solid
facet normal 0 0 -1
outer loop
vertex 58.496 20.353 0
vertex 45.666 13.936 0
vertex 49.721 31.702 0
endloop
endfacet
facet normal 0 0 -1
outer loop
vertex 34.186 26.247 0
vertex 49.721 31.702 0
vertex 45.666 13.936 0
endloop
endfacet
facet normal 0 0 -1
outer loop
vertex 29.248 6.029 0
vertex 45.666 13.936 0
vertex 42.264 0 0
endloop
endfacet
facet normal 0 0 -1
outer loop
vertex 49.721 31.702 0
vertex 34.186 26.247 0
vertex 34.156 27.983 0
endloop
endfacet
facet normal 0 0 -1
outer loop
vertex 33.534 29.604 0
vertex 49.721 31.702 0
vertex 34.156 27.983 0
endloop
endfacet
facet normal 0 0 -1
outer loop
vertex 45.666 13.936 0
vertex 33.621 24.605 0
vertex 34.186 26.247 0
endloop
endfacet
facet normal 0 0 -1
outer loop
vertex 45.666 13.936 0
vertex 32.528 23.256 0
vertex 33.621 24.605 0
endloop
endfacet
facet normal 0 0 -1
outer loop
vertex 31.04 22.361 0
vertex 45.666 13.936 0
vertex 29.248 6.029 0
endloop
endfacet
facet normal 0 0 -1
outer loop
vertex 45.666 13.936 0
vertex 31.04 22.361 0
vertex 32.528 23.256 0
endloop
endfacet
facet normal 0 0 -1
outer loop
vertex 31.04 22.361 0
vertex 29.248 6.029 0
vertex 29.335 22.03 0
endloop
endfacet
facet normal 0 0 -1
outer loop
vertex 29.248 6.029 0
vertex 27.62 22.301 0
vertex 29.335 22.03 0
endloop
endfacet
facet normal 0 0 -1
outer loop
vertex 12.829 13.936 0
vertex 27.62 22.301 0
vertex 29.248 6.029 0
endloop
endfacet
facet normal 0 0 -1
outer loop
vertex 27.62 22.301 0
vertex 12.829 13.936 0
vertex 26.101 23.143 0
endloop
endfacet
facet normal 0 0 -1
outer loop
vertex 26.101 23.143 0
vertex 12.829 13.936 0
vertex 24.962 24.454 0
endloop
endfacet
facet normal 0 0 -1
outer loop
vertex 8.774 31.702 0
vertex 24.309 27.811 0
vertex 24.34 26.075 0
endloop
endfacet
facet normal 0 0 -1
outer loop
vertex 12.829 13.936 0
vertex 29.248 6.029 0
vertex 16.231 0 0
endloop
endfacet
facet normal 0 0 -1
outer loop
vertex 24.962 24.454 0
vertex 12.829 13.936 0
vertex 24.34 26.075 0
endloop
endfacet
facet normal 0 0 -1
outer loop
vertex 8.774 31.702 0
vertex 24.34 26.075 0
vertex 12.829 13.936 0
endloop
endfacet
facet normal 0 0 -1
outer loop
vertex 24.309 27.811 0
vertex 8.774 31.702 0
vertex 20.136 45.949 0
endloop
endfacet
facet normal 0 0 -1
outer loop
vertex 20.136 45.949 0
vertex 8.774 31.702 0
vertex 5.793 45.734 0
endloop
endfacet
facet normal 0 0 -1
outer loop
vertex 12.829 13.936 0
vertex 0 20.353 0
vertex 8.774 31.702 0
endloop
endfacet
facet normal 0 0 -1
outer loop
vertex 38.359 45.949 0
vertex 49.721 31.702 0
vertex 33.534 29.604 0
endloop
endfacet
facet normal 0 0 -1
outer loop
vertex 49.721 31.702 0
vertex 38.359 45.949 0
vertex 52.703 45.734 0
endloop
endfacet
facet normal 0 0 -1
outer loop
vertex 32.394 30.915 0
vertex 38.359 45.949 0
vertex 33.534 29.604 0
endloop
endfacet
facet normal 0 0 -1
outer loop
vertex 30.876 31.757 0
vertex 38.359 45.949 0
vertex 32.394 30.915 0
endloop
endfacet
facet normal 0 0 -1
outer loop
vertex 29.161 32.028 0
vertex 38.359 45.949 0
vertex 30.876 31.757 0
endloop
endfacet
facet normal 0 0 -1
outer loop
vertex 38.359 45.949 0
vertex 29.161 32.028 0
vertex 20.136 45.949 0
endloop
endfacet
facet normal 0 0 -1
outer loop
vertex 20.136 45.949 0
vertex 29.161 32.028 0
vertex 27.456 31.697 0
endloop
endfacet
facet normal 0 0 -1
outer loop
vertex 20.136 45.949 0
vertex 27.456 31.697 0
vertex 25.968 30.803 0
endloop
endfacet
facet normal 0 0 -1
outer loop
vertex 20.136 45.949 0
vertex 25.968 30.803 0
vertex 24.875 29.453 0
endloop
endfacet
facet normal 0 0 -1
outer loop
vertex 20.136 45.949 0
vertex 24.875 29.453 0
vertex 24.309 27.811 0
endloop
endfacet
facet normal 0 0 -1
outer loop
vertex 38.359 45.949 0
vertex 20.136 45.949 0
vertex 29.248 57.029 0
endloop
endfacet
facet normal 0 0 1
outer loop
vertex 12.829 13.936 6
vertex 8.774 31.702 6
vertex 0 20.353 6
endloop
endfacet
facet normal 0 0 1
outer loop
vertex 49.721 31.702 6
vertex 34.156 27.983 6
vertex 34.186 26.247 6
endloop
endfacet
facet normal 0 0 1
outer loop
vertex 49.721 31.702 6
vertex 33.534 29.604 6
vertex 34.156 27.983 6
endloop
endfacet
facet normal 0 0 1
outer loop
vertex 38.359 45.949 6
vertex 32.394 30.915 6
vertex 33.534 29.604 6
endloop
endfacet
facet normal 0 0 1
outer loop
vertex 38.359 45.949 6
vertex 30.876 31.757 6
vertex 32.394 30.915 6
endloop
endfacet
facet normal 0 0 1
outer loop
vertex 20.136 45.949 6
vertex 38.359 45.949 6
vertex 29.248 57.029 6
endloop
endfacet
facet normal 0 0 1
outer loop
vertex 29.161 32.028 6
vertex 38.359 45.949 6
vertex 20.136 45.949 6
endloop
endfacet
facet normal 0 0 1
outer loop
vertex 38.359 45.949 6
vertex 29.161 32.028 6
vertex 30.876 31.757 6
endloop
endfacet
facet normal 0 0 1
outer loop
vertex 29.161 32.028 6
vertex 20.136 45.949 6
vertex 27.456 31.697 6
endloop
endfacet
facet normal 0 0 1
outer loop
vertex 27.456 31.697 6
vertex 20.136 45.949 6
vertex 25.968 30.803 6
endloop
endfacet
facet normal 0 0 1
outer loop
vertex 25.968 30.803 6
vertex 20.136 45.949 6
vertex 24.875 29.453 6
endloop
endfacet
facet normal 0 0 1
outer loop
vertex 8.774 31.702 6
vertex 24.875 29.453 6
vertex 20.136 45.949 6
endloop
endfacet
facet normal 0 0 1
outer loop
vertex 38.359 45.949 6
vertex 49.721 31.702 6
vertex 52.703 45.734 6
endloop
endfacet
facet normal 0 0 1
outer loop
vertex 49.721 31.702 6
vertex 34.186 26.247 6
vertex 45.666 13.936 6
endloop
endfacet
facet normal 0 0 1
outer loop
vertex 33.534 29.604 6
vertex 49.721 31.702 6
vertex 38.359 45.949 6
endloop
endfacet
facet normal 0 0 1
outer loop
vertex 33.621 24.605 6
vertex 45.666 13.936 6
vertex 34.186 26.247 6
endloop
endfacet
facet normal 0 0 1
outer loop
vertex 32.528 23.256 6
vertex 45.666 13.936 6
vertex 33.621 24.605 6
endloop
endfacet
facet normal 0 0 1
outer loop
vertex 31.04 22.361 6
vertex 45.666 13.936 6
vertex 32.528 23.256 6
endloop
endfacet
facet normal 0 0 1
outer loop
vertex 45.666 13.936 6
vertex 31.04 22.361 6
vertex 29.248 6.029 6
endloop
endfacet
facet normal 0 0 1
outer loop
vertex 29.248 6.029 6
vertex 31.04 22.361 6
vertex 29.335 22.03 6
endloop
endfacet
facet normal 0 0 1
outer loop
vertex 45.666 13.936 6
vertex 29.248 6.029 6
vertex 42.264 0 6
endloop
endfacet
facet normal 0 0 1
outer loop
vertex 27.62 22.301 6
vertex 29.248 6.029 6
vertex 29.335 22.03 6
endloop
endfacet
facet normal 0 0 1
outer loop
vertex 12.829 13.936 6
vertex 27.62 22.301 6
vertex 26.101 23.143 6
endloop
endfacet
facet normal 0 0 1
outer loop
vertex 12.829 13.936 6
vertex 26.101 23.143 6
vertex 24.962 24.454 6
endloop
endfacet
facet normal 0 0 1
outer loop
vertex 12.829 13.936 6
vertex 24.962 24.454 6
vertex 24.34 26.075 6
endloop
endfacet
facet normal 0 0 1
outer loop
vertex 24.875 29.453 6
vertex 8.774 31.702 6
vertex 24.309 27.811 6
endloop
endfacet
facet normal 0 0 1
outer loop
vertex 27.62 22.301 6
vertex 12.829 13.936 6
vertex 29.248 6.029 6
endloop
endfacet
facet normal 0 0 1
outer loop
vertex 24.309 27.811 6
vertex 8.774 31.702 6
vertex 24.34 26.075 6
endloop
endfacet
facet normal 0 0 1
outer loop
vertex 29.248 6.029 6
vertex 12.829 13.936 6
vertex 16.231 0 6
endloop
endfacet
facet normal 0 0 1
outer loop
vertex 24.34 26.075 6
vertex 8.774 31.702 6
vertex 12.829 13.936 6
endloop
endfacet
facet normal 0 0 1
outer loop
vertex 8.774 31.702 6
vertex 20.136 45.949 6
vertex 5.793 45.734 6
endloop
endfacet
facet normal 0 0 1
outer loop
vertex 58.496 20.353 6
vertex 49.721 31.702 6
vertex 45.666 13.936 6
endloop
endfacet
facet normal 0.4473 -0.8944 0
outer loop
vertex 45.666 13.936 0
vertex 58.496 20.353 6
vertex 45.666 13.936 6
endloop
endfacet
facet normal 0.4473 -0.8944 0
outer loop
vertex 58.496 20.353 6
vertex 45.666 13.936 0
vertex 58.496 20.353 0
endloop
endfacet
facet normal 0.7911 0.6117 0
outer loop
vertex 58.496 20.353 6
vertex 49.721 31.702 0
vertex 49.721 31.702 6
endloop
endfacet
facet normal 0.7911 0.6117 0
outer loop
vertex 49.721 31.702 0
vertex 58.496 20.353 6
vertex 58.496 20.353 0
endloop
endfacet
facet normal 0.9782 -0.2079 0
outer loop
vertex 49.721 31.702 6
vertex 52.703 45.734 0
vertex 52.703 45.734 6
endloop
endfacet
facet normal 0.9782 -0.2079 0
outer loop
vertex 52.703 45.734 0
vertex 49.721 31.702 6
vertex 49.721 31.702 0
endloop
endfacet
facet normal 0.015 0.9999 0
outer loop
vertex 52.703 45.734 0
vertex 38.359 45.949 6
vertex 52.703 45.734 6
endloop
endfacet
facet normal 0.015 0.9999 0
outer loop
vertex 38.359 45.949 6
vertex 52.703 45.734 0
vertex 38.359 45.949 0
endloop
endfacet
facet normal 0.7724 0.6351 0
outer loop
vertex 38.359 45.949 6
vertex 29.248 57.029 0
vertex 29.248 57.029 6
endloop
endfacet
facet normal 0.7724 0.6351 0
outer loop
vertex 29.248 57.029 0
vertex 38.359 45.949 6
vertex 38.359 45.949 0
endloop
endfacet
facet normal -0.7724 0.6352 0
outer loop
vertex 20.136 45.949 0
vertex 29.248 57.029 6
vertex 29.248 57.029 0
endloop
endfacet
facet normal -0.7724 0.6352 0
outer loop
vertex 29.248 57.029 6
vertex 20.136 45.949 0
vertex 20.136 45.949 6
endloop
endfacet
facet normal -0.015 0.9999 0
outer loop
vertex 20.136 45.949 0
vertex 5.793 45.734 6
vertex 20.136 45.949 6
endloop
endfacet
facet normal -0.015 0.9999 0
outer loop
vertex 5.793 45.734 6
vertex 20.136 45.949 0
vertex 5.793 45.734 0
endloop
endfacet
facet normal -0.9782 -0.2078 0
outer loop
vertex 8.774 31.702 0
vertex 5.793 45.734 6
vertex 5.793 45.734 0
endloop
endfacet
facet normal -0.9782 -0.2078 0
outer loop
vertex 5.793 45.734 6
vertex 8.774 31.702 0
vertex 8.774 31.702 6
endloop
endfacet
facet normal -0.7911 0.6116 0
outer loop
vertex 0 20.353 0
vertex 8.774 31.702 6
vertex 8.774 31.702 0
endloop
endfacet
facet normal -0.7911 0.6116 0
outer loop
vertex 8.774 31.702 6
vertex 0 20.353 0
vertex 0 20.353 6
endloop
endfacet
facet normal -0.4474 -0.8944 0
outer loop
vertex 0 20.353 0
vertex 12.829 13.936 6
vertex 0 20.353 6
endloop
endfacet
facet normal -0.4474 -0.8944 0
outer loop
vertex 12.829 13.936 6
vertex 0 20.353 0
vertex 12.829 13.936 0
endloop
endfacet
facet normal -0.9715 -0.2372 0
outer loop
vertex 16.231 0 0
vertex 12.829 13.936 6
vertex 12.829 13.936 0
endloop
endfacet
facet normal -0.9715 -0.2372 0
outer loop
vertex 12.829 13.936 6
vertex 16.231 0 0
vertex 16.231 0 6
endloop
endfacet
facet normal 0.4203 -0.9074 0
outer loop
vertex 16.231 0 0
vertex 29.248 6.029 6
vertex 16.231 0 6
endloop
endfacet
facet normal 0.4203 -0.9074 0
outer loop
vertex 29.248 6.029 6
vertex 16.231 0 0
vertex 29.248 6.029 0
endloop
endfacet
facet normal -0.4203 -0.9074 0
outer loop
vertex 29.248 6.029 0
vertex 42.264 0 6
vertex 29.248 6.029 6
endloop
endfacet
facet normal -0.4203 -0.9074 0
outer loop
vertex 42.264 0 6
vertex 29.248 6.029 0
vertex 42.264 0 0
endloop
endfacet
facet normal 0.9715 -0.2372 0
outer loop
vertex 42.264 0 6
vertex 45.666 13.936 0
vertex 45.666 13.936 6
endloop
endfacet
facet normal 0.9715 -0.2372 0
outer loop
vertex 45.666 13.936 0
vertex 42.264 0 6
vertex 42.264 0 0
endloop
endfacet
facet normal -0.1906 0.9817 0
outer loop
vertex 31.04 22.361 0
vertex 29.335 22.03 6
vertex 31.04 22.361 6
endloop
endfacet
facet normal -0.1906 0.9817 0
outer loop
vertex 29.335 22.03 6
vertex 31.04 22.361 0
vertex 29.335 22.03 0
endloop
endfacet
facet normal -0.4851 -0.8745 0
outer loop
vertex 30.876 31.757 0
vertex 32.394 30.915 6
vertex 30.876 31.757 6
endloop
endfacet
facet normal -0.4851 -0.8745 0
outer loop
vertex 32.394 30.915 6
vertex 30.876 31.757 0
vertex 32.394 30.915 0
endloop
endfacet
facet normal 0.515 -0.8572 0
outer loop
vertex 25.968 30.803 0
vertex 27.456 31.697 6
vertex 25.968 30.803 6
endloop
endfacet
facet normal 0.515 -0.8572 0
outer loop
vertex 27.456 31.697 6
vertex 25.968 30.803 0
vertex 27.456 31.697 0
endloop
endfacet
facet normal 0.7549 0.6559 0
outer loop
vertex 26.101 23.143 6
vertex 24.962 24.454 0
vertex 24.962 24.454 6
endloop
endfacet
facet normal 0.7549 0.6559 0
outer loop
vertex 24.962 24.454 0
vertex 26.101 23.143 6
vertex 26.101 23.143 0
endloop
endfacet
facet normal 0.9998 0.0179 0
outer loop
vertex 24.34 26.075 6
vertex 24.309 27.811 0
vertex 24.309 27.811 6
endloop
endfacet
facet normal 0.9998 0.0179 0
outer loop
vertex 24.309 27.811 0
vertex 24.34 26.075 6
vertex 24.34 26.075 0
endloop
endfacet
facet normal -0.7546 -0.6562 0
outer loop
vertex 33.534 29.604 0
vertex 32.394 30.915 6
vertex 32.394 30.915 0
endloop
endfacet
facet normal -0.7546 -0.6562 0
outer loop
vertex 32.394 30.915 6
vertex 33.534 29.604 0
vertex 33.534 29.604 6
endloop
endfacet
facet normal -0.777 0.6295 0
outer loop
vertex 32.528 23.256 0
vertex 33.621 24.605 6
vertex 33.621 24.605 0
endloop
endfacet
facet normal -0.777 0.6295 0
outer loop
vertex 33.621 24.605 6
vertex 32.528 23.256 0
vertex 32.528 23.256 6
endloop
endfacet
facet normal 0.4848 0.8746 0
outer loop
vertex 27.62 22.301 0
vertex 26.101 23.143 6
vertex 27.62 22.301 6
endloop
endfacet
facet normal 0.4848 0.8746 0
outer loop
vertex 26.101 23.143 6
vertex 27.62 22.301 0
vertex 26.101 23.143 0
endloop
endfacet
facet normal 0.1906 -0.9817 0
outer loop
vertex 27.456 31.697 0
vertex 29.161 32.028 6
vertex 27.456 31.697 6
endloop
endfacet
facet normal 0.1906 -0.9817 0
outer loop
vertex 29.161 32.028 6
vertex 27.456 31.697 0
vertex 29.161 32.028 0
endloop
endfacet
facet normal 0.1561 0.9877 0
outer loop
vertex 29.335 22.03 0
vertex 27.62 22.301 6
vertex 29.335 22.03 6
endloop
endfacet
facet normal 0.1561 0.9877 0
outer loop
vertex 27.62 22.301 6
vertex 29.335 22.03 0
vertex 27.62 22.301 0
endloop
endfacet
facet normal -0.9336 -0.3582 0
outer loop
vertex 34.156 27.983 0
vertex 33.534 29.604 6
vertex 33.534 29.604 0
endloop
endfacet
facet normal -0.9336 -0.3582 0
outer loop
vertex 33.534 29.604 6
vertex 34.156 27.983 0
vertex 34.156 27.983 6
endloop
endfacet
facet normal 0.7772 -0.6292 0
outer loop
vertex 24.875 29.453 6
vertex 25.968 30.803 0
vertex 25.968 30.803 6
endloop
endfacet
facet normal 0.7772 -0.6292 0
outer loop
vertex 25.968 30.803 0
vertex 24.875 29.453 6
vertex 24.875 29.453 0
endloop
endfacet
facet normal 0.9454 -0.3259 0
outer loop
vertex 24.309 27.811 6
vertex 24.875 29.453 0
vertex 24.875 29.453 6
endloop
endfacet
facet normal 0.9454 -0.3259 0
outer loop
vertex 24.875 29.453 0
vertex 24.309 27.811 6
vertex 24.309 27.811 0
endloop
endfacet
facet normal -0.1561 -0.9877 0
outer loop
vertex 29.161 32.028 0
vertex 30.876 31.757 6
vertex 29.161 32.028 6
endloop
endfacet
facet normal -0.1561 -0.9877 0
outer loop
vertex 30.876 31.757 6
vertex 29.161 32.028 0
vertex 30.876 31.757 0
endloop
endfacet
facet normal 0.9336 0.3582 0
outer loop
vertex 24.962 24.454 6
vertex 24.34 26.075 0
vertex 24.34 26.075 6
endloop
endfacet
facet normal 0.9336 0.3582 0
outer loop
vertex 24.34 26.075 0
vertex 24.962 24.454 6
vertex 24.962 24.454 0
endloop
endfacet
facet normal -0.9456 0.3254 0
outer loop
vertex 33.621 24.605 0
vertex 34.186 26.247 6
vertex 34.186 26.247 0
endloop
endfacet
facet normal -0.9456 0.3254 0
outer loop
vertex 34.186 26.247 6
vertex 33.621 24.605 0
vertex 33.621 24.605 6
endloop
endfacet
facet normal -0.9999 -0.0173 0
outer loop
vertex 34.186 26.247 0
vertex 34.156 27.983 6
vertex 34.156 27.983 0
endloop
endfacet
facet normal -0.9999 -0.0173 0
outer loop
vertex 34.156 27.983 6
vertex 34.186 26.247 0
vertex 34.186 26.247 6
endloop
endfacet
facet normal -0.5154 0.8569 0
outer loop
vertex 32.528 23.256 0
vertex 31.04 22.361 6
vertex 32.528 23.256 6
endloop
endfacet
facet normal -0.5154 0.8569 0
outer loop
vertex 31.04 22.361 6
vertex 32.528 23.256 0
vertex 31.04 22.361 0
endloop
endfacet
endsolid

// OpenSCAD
$fn = 32;

// ----------------------------------------------------------------------
// Star wheel: 7-point blunt, R30
// ----------------------------------------------------------------------

// --- parameters (mm) ---
n_points = 7;             // number of points / teeth
r_out = 30;               // tip radius
r_in = 21;                // root radius
bore_r = 5;               // centre bore radius
plate_t = 6;              // plate thickness, Z (extrusion height)
bore_d = 10;              // centre bore diameter

profile = [[29.248, 57.029], [20.136, 45.949], [5.793, 45.734], [8.774, 31.702], [0, 20.353], [12.829, 13.936], [16.231, 0], [29.248, 6.029], [42.264, 0], [45.666, 13.936], [58.496, 20.353], [49.721, 31.702], [52.703, 45.734], [38.359, 45.949]];  // primary outline, 14 points, counter clockwise
void_1 = [[34.156, 27.983], [33.534, 29.604], [32.394, 30.915], [30.876, 31.757], [29.161, 32.028], [27.456, 31.697], [25.968, 30.803], [24.875, 29.453], [24.309, 27.811], [24.34, 26.075], [24.962, 24.454], [26.101, 23.143], [27.62, 22.301], [29.335, 22.03], [31.04, 22.361], [32.528, 23.256], [33.621, 24.605], [34.186, 26.247]];  // centre bore, 18 points

// --- the one profile operation ---
difference() {
  linear_extrude(height = plate_t) polygon(points = profile);
  translate([0, 0, -1])
    linear_extrude(height = plate_t + 2) polygon(points = void_1);
}
